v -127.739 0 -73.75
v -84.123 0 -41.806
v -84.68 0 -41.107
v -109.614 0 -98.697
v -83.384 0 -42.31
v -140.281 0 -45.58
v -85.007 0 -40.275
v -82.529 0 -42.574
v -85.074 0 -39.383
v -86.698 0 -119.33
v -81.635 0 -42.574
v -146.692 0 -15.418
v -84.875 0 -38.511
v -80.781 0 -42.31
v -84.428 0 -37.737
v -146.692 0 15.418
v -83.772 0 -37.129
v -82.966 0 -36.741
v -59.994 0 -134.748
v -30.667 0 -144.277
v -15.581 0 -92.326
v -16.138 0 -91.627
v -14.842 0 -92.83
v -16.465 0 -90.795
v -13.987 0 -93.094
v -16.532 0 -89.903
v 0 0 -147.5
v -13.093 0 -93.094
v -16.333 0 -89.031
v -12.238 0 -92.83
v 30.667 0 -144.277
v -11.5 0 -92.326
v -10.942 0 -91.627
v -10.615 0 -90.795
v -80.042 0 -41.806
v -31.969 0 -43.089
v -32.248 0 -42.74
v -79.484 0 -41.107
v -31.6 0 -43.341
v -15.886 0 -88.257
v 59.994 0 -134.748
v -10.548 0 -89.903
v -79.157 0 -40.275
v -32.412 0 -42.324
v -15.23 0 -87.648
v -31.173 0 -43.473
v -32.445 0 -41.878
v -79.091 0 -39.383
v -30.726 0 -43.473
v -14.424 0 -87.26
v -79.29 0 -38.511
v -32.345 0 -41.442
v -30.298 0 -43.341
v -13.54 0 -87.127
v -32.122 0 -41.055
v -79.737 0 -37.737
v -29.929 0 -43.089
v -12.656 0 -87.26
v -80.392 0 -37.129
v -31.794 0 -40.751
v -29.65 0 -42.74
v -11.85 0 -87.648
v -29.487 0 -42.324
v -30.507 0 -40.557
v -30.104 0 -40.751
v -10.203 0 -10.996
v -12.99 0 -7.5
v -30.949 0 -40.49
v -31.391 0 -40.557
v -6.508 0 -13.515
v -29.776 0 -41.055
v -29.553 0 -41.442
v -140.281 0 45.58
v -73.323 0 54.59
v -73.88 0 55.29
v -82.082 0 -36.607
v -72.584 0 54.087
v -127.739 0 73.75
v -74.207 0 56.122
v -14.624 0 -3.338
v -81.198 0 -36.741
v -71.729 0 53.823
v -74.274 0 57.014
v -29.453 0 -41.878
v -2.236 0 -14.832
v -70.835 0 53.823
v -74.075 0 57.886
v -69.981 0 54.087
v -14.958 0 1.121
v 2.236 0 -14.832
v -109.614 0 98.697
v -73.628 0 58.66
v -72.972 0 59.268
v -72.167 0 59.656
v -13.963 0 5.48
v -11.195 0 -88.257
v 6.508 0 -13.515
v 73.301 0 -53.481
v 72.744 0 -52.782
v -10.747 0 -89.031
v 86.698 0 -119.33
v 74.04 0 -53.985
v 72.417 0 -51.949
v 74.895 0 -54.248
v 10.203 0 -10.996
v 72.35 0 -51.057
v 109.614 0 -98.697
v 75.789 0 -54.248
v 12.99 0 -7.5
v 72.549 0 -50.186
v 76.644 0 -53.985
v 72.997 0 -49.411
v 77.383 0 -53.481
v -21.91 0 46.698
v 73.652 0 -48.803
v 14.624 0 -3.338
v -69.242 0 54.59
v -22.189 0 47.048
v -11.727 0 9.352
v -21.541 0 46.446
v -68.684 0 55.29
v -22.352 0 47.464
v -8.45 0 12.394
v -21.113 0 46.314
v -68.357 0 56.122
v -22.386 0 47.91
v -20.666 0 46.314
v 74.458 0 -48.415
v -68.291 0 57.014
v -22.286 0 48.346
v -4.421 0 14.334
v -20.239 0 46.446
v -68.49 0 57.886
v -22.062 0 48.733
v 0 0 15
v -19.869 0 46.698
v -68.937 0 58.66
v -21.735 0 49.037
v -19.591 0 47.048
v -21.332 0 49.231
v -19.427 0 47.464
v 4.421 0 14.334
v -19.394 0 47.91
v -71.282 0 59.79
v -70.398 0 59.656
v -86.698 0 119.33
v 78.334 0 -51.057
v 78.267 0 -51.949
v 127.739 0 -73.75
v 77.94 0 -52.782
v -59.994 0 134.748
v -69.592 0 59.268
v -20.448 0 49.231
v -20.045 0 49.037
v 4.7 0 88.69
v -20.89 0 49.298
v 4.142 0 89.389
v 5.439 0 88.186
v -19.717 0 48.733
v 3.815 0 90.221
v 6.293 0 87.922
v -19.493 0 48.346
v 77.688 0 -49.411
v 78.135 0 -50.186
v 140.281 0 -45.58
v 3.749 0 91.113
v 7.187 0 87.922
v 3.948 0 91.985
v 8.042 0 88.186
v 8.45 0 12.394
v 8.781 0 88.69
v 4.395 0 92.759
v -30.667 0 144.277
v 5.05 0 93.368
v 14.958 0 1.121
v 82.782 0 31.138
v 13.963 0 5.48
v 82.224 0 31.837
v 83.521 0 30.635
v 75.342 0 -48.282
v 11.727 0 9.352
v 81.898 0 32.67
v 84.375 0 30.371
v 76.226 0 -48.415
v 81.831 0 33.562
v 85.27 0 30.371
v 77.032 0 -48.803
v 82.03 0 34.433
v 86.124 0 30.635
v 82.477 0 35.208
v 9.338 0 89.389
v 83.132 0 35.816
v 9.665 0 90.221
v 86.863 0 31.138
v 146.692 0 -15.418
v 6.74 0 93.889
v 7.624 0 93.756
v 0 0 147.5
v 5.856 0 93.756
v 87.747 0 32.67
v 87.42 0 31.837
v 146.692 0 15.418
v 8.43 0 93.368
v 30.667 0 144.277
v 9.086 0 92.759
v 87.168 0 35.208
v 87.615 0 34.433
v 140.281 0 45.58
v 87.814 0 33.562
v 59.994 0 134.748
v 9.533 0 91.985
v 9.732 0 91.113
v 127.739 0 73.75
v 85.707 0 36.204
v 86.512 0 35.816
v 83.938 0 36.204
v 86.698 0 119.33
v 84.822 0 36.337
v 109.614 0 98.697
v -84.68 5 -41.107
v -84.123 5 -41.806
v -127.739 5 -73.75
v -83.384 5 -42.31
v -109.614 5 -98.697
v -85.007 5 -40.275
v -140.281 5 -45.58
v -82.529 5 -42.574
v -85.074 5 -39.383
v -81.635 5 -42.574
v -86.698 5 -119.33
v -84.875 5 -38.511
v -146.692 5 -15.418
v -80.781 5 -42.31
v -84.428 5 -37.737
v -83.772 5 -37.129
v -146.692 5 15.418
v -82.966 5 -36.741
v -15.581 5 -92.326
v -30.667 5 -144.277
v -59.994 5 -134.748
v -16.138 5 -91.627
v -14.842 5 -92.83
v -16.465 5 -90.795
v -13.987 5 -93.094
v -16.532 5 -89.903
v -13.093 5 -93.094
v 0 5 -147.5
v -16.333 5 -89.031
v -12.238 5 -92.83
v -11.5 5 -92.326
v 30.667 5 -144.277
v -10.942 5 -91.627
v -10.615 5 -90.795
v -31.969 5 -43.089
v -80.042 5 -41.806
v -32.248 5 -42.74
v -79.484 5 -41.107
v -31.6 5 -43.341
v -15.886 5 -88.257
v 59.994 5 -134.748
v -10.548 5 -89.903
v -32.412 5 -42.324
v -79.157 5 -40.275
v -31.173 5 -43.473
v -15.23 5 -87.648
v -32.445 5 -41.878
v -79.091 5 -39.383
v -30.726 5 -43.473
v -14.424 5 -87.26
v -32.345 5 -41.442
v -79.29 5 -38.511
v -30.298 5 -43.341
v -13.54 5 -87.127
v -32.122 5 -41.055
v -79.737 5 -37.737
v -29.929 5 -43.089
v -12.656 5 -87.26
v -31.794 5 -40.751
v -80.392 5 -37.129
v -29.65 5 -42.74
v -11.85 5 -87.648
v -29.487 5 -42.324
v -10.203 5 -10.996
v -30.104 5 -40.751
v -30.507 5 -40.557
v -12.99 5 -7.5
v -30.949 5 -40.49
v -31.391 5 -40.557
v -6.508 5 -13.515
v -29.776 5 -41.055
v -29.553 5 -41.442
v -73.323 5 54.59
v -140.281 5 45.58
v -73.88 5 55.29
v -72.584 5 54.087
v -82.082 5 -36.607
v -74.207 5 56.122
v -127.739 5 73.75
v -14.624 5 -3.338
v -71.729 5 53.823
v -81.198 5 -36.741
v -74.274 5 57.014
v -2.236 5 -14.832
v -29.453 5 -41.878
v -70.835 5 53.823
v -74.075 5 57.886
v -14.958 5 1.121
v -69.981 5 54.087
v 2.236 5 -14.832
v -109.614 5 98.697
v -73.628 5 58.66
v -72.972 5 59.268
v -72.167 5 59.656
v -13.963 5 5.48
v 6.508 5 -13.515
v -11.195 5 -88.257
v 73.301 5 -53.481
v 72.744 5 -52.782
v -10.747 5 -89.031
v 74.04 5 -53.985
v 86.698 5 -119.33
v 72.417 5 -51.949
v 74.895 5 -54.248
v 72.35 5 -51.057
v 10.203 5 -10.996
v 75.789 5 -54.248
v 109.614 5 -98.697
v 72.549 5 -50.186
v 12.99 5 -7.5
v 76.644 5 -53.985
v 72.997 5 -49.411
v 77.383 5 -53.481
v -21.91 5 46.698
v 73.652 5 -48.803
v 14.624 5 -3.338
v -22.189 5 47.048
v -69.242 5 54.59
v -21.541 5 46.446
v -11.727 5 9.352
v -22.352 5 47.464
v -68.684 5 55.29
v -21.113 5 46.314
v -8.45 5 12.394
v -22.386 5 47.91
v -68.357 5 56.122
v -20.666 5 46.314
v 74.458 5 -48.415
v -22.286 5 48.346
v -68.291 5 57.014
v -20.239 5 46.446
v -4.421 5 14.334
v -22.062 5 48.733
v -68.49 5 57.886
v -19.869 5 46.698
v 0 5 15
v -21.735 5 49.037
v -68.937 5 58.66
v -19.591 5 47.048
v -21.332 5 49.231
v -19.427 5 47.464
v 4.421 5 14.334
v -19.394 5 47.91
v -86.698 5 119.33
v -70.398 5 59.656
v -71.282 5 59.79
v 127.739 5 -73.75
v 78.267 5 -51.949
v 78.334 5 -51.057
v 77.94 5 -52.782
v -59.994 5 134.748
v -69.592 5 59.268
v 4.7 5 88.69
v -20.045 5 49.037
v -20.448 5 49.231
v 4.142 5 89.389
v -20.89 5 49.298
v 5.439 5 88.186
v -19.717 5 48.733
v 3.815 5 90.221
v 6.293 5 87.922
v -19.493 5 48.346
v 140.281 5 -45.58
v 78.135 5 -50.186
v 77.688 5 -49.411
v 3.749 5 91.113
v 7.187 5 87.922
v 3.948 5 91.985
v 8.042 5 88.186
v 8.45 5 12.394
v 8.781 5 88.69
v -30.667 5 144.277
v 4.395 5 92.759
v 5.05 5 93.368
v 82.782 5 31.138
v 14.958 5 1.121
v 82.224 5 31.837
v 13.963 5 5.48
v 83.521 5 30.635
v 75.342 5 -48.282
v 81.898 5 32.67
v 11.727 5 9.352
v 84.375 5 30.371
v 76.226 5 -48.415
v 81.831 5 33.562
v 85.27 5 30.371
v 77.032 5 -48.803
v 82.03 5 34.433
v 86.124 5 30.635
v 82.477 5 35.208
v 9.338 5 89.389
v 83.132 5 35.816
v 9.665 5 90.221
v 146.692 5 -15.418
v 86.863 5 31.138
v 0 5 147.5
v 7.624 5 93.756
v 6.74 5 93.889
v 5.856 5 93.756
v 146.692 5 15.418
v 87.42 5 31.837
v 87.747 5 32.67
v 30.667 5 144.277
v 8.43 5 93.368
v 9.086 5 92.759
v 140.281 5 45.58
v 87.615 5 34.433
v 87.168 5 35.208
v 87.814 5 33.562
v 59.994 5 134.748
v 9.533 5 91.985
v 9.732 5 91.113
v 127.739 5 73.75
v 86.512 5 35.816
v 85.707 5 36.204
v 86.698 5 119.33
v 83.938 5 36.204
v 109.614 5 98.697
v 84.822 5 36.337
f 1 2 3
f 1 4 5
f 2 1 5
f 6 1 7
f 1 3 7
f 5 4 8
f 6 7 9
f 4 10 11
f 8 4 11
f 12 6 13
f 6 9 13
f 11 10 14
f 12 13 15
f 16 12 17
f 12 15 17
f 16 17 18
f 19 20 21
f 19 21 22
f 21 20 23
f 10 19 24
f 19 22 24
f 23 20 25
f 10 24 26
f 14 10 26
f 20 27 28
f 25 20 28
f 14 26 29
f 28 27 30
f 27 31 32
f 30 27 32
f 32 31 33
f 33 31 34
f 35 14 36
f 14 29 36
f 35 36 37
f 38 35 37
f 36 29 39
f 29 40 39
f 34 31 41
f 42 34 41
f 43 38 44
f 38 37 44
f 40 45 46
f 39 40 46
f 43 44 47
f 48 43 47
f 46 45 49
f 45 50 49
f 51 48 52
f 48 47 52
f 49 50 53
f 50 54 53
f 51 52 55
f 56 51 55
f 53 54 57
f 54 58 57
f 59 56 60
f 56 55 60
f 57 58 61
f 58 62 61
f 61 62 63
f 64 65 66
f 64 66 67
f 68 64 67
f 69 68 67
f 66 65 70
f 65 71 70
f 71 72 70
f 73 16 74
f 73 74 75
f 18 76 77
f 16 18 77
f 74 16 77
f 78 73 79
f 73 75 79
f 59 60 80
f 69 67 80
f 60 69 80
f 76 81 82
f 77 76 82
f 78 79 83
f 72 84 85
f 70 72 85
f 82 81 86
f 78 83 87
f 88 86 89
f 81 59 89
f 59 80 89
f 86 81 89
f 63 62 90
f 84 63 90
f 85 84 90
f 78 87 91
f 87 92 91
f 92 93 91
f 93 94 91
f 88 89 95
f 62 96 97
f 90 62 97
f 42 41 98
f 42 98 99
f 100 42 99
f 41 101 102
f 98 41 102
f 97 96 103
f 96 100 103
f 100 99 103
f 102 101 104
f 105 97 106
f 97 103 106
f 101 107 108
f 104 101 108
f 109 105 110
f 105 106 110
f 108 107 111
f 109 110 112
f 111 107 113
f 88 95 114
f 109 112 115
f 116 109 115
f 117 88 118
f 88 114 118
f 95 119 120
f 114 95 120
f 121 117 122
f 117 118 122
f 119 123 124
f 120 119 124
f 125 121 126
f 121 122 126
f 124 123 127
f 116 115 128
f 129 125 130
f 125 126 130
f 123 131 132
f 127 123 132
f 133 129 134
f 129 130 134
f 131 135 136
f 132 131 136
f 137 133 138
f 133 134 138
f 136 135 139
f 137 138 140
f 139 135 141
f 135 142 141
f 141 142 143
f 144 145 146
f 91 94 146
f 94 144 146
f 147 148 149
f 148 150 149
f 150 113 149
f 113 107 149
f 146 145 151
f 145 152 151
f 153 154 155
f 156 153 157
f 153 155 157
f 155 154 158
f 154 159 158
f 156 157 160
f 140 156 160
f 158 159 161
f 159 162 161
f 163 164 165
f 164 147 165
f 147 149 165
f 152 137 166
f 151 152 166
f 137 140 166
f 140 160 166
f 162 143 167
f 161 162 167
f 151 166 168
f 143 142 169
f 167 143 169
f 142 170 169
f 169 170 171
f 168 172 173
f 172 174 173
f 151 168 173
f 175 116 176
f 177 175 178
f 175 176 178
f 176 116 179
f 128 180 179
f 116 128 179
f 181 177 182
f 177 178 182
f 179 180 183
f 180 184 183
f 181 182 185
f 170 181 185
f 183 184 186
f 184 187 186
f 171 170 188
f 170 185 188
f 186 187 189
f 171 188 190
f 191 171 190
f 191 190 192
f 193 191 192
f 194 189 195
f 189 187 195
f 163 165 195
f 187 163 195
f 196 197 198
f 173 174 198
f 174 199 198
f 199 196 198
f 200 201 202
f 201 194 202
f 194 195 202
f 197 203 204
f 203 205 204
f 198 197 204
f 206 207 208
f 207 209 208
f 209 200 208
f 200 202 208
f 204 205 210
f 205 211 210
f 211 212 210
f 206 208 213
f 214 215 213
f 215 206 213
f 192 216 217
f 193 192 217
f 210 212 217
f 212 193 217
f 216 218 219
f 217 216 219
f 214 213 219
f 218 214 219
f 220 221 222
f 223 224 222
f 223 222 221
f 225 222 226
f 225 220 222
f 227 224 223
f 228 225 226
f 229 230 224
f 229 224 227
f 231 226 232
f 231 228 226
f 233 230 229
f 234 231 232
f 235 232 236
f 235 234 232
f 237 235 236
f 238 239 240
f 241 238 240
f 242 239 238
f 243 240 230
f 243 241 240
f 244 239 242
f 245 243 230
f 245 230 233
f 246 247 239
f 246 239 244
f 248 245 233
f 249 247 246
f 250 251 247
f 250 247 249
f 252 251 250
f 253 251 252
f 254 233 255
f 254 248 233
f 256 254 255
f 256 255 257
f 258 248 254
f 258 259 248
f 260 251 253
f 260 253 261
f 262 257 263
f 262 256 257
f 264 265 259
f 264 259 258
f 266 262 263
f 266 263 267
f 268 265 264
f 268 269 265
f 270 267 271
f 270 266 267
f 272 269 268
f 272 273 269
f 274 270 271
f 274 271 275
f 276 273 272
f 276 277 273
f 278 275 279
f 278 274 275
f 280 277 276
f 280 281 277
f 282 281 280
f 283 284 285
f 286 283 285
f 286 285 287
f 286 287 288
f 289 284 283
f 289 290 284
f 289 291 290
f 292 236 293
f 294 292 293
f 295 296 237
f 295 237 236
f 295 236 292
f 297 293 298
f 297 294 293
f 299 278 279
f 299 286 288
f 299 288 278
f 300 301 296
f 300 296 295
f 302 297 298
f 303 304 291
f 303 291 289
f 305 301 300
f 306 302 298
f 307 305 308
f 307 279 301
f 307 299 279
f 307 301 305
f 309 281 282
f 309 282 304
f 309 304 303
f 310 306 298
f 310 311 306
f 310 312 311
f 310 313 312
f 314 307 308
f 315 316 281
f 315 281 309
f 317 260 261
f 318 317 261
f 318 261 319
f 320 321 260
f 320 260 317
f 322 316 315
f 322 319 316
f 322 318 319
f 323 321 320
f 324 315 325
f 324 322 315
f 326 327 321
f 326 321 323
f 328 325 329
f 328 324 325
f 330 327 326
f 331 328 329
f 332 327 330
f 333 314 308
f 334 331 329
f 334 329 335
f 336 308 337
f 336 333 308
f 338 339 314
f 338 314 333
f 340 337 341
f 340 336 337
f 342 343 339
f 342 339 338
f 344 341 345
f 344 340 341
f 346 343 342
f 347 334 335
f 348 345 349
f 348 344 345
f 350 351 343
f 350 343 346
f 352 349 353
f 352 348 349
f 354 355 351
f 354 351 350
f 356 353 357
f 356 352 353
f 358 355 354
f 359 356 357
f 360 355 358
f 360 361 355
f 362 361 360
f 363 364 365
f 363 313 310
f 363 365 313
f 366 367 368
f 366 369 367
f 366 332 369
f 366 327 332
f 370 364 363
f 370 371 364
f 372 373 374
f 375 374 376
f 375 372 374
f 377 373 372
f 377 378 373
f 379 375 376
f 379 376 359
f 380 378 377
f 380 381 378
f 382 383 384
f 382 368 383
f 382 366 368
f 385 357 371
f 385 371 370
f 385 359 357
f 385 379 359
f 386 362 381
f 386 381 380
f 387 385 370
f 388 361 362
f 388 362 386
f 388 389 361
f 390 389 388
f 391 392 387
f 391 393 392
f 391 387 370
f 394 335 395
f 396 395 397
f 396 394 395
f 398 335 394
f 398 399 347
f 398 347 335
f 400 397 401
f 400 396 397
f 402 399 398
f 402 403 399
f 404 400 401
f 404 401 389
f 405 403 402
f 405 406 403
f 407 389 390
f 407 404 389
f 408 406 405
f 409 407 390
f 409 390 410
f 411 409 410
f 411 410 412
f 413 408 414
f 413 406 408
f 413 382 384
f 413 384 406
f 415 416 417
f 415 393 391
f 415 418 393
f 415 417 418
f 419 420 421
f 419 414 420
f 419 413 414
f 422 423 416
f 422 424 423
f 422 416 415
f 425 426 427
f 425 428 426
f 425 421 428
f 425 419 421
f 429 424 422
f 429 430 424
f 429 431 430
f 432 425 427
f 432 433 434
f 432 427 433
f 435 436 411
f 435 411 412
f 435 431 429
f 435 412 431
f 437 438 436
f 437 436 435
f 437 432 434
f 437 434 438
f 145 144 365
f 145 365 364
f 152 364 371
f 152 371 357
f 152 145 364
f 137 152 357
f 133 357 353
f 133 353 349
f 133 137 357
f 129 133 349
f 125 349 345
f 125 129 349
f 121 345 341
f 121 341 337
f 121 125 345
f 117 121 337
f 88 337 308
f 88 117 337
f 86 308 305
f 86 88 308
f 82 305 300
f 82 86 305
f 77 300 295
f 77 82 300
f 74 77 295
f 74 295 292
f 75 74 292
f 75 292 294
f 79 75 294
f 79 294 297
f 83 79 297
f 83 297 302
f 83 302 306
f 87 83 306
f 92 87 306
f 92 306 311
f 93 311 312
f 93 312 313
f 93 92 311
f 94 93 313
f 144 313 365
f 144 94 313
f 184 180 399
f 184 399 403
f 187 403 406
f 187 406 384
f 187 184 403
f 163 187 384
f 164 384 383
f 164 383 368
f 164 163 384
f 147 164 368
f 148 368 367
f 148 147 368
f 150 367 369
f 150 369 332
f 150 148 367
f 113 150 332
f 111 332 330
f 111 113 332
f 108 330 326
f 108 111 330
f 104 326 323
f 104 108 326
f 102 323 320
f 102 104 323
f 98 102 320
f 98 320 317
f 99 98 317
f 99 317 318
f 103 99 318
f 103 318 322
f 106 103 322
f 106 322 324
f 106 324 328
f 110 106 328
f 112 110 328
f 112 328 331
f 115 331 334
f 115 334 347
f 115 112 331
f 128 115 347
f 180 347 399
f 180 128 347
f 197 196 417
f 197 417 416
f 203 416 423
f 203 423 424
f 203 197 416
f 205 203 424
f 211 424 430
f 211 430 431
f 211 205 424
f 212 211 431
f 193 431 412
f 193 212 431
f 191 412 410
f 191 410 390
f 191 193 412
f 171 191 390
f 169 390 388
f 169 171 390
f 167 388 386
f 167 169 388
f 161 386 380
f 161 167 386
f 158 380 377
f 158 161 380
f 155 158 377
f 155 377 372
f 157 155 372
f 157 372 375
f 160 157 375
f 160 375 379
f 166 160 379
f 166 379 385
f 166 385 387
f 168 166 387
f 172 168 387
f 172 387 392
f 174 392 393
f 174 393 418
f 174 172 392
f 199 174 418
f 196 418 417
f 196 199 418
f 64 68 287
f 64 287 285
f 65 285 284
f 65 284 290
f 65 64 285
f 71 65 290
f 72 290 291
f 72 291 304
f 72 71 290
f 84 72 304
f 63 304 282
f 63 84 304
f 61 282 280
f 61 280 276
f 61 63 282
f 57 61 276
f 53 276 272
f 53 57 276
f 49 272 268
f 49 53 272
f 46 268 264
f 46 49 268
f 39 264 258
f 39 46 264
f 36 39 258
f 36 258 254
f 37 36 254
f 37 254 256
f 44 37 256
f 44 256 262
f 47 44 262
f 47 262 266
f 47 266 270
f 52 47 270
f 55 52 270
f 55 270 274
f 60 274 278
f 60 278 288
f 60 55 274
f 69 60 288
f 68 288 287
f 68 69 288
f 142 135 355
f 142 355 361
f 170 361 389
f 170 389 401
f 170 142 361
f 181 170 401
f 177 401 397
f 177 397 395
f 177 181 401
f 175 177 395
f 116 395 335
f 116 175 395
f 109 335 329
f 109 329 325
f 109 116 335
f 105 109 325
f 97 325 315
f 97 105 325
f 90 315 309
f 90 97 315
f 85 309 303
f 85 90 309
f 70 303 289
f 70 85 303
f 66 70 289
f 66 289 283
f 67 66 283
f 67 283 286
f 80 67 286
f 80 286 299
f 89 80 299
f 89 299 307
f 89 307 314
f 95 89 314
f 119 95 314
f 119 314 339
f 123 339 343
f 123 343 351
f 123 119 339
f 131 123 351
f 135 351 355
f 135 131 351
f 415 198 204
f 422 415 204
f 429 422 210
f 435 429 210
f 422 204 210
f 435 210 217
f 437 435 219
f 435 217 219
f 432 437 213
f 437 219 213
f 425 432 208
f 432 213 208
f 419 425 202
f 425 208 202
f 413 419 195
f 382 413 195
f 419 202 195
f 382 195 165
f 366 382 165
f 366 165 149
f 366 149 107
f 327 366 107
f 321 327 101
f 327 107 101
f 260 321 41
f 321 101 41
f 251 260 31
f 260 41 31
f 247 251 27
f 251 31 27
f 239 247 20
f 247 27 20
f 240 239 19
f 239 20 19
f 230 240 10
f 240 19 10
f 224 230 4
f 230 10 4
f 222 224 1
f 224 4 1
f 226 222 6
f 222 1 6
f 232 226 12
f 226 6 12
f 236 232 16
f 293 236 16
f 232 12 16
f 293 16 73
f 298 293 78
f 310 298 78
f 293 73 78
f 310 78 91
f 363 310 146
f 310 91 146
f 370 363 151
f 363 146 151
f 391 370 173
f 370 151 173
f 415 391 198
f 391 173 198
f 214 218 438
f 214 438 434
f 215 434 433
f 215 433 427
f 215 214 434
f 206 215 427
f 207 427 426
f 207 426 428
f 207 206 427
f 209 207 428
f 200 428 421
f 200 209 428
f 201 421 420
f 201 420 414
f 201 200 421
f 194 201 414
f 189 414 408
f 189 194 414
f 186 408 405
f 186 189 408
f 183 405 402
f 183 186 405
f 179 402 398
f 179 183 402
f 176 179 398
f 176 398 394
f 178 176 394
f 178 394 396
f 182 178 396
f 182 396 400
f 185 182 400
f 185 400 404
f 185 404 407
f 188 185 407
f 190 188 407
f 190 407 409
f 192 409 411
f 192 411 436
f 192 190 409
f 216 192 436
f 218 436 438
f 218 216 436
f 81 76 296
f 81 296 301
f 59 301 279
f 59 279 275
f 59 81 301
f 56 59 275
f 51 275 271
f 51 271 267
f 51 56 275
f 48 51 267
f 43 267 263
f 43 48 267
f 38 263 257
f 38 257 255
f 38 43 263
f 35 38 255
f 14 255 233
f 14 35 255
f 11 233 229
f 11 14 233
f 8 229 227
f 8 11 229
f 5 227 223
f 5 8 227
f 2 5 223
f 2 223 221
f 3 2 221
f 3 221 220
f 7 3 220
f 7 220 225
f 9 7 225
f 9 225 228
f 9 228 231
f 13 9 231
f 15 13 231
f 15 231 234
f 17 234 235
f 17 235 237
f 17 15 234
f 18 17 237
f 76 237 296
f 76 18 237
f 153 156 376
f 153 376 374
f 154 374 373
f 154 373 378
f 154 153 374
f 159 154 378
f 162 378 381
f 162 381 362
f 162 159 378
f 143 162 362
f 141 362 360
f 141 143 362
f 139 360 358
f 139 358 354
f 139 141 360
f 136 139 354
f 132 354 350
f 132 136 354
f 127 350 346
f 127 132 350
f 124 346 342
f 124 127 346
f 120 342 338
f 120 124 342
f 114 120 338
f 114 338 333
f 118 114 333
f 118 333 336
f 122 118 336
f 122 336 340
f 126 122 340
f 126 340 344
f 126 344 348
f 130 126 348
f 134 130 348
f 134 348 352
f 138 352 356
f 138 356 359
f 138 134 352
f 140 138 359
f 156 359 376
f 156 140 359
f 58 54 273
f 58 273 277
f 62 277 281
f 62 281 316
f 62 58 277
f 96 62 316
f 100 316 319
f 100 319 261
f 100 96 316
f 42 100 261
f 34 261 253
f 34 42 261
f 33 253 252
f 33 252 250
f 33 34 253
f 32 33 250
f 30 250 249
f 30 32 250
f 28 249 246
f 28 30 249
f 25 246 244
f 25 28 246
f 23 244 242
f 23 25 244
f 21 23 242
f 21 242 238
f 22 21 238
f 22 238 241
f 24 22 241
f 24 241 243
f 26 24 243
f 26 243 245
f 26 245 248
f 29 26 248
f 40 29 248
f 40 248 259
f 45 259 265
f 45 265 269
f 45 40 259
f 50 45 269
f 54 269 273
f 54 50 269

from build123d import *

# Parameters (mm, degrees)
ESQUISSE1_R        = 147.5
ESQUISSE1_R_2      = 15
ESQUISSE1_R_3      = 3
ESQUISSE1_R_4      = 1.5
BOSS_EXTRU_1_DEPTH = 5


with BuildPart() as part:
    # Esquisse1 → Boss.-Extru.1 (new body)
    with BuildSketch(Plane(origin=(0, 0, 0), x_dir=(1, 0, 0), z_dir=(0, 1, 0))):
        with Locations(Location((0, 0, 0), (0, 0, 270))):
            Circle(ESQUISSE1_R)
        with Locations(Location((0, 0, 0), (0, 0, 270))):
            Circle(ESQUISSE1_R_2, mode=Mode.SUBTRACT)
        with Locations(Location((-13.540108487, 90.127070907, 0), (0, 0, 270))):
            Circle(ESQUISSE1_R_3, mode=Mode.SUBTRACT)
        with Locations(Location((-82.082198921, 39.607272923, 0), (0, 0, 270))):
            Circle(ESQUISSE1_R_3, mode=Mode.SUBTRACT)
        with Locations(Location((75.342010962, 51.281622754, 0), (0, 0, 270))):
            Circle(ESQUISSE1_R_3, mode=Mode.SUBTRACT)
        with Locations(Location((84.822389485, -33.337451765, 0), (0, 0, 270))):
            Circle(ESQUISSE1_R_3, mode=Mode.SUBTRACT)
        with Locations(Location((6.740188753, -90.888906384, 0), (0, 0, 270))):
            Circle(ESQUISSE1_R_3, mode=Mode.SUBTRACT)
        with Locations(Location((-71.282271006, -56.78962307, 0), (0, 0, 270))):
            Circle(ESQUISSE1_R_3, mode=Mode.SUBTRACT)
        with Locations(Location((-20.889727943, -47.797718878, 0), (0, 0, 270))):
            Circle(ESQUISSE1_R_4, mode=Mode.SUBTRACT)
        with Locations(Location((-30.949170814, 41.989892072, 0), (0, 0, 270))):
            Circle(ESQUISSE1_R_4, mode=Mode.SUBTRACT)
    extrude(amount=BOSS_EXTRU_1_DEPTH)


solid = part.part
